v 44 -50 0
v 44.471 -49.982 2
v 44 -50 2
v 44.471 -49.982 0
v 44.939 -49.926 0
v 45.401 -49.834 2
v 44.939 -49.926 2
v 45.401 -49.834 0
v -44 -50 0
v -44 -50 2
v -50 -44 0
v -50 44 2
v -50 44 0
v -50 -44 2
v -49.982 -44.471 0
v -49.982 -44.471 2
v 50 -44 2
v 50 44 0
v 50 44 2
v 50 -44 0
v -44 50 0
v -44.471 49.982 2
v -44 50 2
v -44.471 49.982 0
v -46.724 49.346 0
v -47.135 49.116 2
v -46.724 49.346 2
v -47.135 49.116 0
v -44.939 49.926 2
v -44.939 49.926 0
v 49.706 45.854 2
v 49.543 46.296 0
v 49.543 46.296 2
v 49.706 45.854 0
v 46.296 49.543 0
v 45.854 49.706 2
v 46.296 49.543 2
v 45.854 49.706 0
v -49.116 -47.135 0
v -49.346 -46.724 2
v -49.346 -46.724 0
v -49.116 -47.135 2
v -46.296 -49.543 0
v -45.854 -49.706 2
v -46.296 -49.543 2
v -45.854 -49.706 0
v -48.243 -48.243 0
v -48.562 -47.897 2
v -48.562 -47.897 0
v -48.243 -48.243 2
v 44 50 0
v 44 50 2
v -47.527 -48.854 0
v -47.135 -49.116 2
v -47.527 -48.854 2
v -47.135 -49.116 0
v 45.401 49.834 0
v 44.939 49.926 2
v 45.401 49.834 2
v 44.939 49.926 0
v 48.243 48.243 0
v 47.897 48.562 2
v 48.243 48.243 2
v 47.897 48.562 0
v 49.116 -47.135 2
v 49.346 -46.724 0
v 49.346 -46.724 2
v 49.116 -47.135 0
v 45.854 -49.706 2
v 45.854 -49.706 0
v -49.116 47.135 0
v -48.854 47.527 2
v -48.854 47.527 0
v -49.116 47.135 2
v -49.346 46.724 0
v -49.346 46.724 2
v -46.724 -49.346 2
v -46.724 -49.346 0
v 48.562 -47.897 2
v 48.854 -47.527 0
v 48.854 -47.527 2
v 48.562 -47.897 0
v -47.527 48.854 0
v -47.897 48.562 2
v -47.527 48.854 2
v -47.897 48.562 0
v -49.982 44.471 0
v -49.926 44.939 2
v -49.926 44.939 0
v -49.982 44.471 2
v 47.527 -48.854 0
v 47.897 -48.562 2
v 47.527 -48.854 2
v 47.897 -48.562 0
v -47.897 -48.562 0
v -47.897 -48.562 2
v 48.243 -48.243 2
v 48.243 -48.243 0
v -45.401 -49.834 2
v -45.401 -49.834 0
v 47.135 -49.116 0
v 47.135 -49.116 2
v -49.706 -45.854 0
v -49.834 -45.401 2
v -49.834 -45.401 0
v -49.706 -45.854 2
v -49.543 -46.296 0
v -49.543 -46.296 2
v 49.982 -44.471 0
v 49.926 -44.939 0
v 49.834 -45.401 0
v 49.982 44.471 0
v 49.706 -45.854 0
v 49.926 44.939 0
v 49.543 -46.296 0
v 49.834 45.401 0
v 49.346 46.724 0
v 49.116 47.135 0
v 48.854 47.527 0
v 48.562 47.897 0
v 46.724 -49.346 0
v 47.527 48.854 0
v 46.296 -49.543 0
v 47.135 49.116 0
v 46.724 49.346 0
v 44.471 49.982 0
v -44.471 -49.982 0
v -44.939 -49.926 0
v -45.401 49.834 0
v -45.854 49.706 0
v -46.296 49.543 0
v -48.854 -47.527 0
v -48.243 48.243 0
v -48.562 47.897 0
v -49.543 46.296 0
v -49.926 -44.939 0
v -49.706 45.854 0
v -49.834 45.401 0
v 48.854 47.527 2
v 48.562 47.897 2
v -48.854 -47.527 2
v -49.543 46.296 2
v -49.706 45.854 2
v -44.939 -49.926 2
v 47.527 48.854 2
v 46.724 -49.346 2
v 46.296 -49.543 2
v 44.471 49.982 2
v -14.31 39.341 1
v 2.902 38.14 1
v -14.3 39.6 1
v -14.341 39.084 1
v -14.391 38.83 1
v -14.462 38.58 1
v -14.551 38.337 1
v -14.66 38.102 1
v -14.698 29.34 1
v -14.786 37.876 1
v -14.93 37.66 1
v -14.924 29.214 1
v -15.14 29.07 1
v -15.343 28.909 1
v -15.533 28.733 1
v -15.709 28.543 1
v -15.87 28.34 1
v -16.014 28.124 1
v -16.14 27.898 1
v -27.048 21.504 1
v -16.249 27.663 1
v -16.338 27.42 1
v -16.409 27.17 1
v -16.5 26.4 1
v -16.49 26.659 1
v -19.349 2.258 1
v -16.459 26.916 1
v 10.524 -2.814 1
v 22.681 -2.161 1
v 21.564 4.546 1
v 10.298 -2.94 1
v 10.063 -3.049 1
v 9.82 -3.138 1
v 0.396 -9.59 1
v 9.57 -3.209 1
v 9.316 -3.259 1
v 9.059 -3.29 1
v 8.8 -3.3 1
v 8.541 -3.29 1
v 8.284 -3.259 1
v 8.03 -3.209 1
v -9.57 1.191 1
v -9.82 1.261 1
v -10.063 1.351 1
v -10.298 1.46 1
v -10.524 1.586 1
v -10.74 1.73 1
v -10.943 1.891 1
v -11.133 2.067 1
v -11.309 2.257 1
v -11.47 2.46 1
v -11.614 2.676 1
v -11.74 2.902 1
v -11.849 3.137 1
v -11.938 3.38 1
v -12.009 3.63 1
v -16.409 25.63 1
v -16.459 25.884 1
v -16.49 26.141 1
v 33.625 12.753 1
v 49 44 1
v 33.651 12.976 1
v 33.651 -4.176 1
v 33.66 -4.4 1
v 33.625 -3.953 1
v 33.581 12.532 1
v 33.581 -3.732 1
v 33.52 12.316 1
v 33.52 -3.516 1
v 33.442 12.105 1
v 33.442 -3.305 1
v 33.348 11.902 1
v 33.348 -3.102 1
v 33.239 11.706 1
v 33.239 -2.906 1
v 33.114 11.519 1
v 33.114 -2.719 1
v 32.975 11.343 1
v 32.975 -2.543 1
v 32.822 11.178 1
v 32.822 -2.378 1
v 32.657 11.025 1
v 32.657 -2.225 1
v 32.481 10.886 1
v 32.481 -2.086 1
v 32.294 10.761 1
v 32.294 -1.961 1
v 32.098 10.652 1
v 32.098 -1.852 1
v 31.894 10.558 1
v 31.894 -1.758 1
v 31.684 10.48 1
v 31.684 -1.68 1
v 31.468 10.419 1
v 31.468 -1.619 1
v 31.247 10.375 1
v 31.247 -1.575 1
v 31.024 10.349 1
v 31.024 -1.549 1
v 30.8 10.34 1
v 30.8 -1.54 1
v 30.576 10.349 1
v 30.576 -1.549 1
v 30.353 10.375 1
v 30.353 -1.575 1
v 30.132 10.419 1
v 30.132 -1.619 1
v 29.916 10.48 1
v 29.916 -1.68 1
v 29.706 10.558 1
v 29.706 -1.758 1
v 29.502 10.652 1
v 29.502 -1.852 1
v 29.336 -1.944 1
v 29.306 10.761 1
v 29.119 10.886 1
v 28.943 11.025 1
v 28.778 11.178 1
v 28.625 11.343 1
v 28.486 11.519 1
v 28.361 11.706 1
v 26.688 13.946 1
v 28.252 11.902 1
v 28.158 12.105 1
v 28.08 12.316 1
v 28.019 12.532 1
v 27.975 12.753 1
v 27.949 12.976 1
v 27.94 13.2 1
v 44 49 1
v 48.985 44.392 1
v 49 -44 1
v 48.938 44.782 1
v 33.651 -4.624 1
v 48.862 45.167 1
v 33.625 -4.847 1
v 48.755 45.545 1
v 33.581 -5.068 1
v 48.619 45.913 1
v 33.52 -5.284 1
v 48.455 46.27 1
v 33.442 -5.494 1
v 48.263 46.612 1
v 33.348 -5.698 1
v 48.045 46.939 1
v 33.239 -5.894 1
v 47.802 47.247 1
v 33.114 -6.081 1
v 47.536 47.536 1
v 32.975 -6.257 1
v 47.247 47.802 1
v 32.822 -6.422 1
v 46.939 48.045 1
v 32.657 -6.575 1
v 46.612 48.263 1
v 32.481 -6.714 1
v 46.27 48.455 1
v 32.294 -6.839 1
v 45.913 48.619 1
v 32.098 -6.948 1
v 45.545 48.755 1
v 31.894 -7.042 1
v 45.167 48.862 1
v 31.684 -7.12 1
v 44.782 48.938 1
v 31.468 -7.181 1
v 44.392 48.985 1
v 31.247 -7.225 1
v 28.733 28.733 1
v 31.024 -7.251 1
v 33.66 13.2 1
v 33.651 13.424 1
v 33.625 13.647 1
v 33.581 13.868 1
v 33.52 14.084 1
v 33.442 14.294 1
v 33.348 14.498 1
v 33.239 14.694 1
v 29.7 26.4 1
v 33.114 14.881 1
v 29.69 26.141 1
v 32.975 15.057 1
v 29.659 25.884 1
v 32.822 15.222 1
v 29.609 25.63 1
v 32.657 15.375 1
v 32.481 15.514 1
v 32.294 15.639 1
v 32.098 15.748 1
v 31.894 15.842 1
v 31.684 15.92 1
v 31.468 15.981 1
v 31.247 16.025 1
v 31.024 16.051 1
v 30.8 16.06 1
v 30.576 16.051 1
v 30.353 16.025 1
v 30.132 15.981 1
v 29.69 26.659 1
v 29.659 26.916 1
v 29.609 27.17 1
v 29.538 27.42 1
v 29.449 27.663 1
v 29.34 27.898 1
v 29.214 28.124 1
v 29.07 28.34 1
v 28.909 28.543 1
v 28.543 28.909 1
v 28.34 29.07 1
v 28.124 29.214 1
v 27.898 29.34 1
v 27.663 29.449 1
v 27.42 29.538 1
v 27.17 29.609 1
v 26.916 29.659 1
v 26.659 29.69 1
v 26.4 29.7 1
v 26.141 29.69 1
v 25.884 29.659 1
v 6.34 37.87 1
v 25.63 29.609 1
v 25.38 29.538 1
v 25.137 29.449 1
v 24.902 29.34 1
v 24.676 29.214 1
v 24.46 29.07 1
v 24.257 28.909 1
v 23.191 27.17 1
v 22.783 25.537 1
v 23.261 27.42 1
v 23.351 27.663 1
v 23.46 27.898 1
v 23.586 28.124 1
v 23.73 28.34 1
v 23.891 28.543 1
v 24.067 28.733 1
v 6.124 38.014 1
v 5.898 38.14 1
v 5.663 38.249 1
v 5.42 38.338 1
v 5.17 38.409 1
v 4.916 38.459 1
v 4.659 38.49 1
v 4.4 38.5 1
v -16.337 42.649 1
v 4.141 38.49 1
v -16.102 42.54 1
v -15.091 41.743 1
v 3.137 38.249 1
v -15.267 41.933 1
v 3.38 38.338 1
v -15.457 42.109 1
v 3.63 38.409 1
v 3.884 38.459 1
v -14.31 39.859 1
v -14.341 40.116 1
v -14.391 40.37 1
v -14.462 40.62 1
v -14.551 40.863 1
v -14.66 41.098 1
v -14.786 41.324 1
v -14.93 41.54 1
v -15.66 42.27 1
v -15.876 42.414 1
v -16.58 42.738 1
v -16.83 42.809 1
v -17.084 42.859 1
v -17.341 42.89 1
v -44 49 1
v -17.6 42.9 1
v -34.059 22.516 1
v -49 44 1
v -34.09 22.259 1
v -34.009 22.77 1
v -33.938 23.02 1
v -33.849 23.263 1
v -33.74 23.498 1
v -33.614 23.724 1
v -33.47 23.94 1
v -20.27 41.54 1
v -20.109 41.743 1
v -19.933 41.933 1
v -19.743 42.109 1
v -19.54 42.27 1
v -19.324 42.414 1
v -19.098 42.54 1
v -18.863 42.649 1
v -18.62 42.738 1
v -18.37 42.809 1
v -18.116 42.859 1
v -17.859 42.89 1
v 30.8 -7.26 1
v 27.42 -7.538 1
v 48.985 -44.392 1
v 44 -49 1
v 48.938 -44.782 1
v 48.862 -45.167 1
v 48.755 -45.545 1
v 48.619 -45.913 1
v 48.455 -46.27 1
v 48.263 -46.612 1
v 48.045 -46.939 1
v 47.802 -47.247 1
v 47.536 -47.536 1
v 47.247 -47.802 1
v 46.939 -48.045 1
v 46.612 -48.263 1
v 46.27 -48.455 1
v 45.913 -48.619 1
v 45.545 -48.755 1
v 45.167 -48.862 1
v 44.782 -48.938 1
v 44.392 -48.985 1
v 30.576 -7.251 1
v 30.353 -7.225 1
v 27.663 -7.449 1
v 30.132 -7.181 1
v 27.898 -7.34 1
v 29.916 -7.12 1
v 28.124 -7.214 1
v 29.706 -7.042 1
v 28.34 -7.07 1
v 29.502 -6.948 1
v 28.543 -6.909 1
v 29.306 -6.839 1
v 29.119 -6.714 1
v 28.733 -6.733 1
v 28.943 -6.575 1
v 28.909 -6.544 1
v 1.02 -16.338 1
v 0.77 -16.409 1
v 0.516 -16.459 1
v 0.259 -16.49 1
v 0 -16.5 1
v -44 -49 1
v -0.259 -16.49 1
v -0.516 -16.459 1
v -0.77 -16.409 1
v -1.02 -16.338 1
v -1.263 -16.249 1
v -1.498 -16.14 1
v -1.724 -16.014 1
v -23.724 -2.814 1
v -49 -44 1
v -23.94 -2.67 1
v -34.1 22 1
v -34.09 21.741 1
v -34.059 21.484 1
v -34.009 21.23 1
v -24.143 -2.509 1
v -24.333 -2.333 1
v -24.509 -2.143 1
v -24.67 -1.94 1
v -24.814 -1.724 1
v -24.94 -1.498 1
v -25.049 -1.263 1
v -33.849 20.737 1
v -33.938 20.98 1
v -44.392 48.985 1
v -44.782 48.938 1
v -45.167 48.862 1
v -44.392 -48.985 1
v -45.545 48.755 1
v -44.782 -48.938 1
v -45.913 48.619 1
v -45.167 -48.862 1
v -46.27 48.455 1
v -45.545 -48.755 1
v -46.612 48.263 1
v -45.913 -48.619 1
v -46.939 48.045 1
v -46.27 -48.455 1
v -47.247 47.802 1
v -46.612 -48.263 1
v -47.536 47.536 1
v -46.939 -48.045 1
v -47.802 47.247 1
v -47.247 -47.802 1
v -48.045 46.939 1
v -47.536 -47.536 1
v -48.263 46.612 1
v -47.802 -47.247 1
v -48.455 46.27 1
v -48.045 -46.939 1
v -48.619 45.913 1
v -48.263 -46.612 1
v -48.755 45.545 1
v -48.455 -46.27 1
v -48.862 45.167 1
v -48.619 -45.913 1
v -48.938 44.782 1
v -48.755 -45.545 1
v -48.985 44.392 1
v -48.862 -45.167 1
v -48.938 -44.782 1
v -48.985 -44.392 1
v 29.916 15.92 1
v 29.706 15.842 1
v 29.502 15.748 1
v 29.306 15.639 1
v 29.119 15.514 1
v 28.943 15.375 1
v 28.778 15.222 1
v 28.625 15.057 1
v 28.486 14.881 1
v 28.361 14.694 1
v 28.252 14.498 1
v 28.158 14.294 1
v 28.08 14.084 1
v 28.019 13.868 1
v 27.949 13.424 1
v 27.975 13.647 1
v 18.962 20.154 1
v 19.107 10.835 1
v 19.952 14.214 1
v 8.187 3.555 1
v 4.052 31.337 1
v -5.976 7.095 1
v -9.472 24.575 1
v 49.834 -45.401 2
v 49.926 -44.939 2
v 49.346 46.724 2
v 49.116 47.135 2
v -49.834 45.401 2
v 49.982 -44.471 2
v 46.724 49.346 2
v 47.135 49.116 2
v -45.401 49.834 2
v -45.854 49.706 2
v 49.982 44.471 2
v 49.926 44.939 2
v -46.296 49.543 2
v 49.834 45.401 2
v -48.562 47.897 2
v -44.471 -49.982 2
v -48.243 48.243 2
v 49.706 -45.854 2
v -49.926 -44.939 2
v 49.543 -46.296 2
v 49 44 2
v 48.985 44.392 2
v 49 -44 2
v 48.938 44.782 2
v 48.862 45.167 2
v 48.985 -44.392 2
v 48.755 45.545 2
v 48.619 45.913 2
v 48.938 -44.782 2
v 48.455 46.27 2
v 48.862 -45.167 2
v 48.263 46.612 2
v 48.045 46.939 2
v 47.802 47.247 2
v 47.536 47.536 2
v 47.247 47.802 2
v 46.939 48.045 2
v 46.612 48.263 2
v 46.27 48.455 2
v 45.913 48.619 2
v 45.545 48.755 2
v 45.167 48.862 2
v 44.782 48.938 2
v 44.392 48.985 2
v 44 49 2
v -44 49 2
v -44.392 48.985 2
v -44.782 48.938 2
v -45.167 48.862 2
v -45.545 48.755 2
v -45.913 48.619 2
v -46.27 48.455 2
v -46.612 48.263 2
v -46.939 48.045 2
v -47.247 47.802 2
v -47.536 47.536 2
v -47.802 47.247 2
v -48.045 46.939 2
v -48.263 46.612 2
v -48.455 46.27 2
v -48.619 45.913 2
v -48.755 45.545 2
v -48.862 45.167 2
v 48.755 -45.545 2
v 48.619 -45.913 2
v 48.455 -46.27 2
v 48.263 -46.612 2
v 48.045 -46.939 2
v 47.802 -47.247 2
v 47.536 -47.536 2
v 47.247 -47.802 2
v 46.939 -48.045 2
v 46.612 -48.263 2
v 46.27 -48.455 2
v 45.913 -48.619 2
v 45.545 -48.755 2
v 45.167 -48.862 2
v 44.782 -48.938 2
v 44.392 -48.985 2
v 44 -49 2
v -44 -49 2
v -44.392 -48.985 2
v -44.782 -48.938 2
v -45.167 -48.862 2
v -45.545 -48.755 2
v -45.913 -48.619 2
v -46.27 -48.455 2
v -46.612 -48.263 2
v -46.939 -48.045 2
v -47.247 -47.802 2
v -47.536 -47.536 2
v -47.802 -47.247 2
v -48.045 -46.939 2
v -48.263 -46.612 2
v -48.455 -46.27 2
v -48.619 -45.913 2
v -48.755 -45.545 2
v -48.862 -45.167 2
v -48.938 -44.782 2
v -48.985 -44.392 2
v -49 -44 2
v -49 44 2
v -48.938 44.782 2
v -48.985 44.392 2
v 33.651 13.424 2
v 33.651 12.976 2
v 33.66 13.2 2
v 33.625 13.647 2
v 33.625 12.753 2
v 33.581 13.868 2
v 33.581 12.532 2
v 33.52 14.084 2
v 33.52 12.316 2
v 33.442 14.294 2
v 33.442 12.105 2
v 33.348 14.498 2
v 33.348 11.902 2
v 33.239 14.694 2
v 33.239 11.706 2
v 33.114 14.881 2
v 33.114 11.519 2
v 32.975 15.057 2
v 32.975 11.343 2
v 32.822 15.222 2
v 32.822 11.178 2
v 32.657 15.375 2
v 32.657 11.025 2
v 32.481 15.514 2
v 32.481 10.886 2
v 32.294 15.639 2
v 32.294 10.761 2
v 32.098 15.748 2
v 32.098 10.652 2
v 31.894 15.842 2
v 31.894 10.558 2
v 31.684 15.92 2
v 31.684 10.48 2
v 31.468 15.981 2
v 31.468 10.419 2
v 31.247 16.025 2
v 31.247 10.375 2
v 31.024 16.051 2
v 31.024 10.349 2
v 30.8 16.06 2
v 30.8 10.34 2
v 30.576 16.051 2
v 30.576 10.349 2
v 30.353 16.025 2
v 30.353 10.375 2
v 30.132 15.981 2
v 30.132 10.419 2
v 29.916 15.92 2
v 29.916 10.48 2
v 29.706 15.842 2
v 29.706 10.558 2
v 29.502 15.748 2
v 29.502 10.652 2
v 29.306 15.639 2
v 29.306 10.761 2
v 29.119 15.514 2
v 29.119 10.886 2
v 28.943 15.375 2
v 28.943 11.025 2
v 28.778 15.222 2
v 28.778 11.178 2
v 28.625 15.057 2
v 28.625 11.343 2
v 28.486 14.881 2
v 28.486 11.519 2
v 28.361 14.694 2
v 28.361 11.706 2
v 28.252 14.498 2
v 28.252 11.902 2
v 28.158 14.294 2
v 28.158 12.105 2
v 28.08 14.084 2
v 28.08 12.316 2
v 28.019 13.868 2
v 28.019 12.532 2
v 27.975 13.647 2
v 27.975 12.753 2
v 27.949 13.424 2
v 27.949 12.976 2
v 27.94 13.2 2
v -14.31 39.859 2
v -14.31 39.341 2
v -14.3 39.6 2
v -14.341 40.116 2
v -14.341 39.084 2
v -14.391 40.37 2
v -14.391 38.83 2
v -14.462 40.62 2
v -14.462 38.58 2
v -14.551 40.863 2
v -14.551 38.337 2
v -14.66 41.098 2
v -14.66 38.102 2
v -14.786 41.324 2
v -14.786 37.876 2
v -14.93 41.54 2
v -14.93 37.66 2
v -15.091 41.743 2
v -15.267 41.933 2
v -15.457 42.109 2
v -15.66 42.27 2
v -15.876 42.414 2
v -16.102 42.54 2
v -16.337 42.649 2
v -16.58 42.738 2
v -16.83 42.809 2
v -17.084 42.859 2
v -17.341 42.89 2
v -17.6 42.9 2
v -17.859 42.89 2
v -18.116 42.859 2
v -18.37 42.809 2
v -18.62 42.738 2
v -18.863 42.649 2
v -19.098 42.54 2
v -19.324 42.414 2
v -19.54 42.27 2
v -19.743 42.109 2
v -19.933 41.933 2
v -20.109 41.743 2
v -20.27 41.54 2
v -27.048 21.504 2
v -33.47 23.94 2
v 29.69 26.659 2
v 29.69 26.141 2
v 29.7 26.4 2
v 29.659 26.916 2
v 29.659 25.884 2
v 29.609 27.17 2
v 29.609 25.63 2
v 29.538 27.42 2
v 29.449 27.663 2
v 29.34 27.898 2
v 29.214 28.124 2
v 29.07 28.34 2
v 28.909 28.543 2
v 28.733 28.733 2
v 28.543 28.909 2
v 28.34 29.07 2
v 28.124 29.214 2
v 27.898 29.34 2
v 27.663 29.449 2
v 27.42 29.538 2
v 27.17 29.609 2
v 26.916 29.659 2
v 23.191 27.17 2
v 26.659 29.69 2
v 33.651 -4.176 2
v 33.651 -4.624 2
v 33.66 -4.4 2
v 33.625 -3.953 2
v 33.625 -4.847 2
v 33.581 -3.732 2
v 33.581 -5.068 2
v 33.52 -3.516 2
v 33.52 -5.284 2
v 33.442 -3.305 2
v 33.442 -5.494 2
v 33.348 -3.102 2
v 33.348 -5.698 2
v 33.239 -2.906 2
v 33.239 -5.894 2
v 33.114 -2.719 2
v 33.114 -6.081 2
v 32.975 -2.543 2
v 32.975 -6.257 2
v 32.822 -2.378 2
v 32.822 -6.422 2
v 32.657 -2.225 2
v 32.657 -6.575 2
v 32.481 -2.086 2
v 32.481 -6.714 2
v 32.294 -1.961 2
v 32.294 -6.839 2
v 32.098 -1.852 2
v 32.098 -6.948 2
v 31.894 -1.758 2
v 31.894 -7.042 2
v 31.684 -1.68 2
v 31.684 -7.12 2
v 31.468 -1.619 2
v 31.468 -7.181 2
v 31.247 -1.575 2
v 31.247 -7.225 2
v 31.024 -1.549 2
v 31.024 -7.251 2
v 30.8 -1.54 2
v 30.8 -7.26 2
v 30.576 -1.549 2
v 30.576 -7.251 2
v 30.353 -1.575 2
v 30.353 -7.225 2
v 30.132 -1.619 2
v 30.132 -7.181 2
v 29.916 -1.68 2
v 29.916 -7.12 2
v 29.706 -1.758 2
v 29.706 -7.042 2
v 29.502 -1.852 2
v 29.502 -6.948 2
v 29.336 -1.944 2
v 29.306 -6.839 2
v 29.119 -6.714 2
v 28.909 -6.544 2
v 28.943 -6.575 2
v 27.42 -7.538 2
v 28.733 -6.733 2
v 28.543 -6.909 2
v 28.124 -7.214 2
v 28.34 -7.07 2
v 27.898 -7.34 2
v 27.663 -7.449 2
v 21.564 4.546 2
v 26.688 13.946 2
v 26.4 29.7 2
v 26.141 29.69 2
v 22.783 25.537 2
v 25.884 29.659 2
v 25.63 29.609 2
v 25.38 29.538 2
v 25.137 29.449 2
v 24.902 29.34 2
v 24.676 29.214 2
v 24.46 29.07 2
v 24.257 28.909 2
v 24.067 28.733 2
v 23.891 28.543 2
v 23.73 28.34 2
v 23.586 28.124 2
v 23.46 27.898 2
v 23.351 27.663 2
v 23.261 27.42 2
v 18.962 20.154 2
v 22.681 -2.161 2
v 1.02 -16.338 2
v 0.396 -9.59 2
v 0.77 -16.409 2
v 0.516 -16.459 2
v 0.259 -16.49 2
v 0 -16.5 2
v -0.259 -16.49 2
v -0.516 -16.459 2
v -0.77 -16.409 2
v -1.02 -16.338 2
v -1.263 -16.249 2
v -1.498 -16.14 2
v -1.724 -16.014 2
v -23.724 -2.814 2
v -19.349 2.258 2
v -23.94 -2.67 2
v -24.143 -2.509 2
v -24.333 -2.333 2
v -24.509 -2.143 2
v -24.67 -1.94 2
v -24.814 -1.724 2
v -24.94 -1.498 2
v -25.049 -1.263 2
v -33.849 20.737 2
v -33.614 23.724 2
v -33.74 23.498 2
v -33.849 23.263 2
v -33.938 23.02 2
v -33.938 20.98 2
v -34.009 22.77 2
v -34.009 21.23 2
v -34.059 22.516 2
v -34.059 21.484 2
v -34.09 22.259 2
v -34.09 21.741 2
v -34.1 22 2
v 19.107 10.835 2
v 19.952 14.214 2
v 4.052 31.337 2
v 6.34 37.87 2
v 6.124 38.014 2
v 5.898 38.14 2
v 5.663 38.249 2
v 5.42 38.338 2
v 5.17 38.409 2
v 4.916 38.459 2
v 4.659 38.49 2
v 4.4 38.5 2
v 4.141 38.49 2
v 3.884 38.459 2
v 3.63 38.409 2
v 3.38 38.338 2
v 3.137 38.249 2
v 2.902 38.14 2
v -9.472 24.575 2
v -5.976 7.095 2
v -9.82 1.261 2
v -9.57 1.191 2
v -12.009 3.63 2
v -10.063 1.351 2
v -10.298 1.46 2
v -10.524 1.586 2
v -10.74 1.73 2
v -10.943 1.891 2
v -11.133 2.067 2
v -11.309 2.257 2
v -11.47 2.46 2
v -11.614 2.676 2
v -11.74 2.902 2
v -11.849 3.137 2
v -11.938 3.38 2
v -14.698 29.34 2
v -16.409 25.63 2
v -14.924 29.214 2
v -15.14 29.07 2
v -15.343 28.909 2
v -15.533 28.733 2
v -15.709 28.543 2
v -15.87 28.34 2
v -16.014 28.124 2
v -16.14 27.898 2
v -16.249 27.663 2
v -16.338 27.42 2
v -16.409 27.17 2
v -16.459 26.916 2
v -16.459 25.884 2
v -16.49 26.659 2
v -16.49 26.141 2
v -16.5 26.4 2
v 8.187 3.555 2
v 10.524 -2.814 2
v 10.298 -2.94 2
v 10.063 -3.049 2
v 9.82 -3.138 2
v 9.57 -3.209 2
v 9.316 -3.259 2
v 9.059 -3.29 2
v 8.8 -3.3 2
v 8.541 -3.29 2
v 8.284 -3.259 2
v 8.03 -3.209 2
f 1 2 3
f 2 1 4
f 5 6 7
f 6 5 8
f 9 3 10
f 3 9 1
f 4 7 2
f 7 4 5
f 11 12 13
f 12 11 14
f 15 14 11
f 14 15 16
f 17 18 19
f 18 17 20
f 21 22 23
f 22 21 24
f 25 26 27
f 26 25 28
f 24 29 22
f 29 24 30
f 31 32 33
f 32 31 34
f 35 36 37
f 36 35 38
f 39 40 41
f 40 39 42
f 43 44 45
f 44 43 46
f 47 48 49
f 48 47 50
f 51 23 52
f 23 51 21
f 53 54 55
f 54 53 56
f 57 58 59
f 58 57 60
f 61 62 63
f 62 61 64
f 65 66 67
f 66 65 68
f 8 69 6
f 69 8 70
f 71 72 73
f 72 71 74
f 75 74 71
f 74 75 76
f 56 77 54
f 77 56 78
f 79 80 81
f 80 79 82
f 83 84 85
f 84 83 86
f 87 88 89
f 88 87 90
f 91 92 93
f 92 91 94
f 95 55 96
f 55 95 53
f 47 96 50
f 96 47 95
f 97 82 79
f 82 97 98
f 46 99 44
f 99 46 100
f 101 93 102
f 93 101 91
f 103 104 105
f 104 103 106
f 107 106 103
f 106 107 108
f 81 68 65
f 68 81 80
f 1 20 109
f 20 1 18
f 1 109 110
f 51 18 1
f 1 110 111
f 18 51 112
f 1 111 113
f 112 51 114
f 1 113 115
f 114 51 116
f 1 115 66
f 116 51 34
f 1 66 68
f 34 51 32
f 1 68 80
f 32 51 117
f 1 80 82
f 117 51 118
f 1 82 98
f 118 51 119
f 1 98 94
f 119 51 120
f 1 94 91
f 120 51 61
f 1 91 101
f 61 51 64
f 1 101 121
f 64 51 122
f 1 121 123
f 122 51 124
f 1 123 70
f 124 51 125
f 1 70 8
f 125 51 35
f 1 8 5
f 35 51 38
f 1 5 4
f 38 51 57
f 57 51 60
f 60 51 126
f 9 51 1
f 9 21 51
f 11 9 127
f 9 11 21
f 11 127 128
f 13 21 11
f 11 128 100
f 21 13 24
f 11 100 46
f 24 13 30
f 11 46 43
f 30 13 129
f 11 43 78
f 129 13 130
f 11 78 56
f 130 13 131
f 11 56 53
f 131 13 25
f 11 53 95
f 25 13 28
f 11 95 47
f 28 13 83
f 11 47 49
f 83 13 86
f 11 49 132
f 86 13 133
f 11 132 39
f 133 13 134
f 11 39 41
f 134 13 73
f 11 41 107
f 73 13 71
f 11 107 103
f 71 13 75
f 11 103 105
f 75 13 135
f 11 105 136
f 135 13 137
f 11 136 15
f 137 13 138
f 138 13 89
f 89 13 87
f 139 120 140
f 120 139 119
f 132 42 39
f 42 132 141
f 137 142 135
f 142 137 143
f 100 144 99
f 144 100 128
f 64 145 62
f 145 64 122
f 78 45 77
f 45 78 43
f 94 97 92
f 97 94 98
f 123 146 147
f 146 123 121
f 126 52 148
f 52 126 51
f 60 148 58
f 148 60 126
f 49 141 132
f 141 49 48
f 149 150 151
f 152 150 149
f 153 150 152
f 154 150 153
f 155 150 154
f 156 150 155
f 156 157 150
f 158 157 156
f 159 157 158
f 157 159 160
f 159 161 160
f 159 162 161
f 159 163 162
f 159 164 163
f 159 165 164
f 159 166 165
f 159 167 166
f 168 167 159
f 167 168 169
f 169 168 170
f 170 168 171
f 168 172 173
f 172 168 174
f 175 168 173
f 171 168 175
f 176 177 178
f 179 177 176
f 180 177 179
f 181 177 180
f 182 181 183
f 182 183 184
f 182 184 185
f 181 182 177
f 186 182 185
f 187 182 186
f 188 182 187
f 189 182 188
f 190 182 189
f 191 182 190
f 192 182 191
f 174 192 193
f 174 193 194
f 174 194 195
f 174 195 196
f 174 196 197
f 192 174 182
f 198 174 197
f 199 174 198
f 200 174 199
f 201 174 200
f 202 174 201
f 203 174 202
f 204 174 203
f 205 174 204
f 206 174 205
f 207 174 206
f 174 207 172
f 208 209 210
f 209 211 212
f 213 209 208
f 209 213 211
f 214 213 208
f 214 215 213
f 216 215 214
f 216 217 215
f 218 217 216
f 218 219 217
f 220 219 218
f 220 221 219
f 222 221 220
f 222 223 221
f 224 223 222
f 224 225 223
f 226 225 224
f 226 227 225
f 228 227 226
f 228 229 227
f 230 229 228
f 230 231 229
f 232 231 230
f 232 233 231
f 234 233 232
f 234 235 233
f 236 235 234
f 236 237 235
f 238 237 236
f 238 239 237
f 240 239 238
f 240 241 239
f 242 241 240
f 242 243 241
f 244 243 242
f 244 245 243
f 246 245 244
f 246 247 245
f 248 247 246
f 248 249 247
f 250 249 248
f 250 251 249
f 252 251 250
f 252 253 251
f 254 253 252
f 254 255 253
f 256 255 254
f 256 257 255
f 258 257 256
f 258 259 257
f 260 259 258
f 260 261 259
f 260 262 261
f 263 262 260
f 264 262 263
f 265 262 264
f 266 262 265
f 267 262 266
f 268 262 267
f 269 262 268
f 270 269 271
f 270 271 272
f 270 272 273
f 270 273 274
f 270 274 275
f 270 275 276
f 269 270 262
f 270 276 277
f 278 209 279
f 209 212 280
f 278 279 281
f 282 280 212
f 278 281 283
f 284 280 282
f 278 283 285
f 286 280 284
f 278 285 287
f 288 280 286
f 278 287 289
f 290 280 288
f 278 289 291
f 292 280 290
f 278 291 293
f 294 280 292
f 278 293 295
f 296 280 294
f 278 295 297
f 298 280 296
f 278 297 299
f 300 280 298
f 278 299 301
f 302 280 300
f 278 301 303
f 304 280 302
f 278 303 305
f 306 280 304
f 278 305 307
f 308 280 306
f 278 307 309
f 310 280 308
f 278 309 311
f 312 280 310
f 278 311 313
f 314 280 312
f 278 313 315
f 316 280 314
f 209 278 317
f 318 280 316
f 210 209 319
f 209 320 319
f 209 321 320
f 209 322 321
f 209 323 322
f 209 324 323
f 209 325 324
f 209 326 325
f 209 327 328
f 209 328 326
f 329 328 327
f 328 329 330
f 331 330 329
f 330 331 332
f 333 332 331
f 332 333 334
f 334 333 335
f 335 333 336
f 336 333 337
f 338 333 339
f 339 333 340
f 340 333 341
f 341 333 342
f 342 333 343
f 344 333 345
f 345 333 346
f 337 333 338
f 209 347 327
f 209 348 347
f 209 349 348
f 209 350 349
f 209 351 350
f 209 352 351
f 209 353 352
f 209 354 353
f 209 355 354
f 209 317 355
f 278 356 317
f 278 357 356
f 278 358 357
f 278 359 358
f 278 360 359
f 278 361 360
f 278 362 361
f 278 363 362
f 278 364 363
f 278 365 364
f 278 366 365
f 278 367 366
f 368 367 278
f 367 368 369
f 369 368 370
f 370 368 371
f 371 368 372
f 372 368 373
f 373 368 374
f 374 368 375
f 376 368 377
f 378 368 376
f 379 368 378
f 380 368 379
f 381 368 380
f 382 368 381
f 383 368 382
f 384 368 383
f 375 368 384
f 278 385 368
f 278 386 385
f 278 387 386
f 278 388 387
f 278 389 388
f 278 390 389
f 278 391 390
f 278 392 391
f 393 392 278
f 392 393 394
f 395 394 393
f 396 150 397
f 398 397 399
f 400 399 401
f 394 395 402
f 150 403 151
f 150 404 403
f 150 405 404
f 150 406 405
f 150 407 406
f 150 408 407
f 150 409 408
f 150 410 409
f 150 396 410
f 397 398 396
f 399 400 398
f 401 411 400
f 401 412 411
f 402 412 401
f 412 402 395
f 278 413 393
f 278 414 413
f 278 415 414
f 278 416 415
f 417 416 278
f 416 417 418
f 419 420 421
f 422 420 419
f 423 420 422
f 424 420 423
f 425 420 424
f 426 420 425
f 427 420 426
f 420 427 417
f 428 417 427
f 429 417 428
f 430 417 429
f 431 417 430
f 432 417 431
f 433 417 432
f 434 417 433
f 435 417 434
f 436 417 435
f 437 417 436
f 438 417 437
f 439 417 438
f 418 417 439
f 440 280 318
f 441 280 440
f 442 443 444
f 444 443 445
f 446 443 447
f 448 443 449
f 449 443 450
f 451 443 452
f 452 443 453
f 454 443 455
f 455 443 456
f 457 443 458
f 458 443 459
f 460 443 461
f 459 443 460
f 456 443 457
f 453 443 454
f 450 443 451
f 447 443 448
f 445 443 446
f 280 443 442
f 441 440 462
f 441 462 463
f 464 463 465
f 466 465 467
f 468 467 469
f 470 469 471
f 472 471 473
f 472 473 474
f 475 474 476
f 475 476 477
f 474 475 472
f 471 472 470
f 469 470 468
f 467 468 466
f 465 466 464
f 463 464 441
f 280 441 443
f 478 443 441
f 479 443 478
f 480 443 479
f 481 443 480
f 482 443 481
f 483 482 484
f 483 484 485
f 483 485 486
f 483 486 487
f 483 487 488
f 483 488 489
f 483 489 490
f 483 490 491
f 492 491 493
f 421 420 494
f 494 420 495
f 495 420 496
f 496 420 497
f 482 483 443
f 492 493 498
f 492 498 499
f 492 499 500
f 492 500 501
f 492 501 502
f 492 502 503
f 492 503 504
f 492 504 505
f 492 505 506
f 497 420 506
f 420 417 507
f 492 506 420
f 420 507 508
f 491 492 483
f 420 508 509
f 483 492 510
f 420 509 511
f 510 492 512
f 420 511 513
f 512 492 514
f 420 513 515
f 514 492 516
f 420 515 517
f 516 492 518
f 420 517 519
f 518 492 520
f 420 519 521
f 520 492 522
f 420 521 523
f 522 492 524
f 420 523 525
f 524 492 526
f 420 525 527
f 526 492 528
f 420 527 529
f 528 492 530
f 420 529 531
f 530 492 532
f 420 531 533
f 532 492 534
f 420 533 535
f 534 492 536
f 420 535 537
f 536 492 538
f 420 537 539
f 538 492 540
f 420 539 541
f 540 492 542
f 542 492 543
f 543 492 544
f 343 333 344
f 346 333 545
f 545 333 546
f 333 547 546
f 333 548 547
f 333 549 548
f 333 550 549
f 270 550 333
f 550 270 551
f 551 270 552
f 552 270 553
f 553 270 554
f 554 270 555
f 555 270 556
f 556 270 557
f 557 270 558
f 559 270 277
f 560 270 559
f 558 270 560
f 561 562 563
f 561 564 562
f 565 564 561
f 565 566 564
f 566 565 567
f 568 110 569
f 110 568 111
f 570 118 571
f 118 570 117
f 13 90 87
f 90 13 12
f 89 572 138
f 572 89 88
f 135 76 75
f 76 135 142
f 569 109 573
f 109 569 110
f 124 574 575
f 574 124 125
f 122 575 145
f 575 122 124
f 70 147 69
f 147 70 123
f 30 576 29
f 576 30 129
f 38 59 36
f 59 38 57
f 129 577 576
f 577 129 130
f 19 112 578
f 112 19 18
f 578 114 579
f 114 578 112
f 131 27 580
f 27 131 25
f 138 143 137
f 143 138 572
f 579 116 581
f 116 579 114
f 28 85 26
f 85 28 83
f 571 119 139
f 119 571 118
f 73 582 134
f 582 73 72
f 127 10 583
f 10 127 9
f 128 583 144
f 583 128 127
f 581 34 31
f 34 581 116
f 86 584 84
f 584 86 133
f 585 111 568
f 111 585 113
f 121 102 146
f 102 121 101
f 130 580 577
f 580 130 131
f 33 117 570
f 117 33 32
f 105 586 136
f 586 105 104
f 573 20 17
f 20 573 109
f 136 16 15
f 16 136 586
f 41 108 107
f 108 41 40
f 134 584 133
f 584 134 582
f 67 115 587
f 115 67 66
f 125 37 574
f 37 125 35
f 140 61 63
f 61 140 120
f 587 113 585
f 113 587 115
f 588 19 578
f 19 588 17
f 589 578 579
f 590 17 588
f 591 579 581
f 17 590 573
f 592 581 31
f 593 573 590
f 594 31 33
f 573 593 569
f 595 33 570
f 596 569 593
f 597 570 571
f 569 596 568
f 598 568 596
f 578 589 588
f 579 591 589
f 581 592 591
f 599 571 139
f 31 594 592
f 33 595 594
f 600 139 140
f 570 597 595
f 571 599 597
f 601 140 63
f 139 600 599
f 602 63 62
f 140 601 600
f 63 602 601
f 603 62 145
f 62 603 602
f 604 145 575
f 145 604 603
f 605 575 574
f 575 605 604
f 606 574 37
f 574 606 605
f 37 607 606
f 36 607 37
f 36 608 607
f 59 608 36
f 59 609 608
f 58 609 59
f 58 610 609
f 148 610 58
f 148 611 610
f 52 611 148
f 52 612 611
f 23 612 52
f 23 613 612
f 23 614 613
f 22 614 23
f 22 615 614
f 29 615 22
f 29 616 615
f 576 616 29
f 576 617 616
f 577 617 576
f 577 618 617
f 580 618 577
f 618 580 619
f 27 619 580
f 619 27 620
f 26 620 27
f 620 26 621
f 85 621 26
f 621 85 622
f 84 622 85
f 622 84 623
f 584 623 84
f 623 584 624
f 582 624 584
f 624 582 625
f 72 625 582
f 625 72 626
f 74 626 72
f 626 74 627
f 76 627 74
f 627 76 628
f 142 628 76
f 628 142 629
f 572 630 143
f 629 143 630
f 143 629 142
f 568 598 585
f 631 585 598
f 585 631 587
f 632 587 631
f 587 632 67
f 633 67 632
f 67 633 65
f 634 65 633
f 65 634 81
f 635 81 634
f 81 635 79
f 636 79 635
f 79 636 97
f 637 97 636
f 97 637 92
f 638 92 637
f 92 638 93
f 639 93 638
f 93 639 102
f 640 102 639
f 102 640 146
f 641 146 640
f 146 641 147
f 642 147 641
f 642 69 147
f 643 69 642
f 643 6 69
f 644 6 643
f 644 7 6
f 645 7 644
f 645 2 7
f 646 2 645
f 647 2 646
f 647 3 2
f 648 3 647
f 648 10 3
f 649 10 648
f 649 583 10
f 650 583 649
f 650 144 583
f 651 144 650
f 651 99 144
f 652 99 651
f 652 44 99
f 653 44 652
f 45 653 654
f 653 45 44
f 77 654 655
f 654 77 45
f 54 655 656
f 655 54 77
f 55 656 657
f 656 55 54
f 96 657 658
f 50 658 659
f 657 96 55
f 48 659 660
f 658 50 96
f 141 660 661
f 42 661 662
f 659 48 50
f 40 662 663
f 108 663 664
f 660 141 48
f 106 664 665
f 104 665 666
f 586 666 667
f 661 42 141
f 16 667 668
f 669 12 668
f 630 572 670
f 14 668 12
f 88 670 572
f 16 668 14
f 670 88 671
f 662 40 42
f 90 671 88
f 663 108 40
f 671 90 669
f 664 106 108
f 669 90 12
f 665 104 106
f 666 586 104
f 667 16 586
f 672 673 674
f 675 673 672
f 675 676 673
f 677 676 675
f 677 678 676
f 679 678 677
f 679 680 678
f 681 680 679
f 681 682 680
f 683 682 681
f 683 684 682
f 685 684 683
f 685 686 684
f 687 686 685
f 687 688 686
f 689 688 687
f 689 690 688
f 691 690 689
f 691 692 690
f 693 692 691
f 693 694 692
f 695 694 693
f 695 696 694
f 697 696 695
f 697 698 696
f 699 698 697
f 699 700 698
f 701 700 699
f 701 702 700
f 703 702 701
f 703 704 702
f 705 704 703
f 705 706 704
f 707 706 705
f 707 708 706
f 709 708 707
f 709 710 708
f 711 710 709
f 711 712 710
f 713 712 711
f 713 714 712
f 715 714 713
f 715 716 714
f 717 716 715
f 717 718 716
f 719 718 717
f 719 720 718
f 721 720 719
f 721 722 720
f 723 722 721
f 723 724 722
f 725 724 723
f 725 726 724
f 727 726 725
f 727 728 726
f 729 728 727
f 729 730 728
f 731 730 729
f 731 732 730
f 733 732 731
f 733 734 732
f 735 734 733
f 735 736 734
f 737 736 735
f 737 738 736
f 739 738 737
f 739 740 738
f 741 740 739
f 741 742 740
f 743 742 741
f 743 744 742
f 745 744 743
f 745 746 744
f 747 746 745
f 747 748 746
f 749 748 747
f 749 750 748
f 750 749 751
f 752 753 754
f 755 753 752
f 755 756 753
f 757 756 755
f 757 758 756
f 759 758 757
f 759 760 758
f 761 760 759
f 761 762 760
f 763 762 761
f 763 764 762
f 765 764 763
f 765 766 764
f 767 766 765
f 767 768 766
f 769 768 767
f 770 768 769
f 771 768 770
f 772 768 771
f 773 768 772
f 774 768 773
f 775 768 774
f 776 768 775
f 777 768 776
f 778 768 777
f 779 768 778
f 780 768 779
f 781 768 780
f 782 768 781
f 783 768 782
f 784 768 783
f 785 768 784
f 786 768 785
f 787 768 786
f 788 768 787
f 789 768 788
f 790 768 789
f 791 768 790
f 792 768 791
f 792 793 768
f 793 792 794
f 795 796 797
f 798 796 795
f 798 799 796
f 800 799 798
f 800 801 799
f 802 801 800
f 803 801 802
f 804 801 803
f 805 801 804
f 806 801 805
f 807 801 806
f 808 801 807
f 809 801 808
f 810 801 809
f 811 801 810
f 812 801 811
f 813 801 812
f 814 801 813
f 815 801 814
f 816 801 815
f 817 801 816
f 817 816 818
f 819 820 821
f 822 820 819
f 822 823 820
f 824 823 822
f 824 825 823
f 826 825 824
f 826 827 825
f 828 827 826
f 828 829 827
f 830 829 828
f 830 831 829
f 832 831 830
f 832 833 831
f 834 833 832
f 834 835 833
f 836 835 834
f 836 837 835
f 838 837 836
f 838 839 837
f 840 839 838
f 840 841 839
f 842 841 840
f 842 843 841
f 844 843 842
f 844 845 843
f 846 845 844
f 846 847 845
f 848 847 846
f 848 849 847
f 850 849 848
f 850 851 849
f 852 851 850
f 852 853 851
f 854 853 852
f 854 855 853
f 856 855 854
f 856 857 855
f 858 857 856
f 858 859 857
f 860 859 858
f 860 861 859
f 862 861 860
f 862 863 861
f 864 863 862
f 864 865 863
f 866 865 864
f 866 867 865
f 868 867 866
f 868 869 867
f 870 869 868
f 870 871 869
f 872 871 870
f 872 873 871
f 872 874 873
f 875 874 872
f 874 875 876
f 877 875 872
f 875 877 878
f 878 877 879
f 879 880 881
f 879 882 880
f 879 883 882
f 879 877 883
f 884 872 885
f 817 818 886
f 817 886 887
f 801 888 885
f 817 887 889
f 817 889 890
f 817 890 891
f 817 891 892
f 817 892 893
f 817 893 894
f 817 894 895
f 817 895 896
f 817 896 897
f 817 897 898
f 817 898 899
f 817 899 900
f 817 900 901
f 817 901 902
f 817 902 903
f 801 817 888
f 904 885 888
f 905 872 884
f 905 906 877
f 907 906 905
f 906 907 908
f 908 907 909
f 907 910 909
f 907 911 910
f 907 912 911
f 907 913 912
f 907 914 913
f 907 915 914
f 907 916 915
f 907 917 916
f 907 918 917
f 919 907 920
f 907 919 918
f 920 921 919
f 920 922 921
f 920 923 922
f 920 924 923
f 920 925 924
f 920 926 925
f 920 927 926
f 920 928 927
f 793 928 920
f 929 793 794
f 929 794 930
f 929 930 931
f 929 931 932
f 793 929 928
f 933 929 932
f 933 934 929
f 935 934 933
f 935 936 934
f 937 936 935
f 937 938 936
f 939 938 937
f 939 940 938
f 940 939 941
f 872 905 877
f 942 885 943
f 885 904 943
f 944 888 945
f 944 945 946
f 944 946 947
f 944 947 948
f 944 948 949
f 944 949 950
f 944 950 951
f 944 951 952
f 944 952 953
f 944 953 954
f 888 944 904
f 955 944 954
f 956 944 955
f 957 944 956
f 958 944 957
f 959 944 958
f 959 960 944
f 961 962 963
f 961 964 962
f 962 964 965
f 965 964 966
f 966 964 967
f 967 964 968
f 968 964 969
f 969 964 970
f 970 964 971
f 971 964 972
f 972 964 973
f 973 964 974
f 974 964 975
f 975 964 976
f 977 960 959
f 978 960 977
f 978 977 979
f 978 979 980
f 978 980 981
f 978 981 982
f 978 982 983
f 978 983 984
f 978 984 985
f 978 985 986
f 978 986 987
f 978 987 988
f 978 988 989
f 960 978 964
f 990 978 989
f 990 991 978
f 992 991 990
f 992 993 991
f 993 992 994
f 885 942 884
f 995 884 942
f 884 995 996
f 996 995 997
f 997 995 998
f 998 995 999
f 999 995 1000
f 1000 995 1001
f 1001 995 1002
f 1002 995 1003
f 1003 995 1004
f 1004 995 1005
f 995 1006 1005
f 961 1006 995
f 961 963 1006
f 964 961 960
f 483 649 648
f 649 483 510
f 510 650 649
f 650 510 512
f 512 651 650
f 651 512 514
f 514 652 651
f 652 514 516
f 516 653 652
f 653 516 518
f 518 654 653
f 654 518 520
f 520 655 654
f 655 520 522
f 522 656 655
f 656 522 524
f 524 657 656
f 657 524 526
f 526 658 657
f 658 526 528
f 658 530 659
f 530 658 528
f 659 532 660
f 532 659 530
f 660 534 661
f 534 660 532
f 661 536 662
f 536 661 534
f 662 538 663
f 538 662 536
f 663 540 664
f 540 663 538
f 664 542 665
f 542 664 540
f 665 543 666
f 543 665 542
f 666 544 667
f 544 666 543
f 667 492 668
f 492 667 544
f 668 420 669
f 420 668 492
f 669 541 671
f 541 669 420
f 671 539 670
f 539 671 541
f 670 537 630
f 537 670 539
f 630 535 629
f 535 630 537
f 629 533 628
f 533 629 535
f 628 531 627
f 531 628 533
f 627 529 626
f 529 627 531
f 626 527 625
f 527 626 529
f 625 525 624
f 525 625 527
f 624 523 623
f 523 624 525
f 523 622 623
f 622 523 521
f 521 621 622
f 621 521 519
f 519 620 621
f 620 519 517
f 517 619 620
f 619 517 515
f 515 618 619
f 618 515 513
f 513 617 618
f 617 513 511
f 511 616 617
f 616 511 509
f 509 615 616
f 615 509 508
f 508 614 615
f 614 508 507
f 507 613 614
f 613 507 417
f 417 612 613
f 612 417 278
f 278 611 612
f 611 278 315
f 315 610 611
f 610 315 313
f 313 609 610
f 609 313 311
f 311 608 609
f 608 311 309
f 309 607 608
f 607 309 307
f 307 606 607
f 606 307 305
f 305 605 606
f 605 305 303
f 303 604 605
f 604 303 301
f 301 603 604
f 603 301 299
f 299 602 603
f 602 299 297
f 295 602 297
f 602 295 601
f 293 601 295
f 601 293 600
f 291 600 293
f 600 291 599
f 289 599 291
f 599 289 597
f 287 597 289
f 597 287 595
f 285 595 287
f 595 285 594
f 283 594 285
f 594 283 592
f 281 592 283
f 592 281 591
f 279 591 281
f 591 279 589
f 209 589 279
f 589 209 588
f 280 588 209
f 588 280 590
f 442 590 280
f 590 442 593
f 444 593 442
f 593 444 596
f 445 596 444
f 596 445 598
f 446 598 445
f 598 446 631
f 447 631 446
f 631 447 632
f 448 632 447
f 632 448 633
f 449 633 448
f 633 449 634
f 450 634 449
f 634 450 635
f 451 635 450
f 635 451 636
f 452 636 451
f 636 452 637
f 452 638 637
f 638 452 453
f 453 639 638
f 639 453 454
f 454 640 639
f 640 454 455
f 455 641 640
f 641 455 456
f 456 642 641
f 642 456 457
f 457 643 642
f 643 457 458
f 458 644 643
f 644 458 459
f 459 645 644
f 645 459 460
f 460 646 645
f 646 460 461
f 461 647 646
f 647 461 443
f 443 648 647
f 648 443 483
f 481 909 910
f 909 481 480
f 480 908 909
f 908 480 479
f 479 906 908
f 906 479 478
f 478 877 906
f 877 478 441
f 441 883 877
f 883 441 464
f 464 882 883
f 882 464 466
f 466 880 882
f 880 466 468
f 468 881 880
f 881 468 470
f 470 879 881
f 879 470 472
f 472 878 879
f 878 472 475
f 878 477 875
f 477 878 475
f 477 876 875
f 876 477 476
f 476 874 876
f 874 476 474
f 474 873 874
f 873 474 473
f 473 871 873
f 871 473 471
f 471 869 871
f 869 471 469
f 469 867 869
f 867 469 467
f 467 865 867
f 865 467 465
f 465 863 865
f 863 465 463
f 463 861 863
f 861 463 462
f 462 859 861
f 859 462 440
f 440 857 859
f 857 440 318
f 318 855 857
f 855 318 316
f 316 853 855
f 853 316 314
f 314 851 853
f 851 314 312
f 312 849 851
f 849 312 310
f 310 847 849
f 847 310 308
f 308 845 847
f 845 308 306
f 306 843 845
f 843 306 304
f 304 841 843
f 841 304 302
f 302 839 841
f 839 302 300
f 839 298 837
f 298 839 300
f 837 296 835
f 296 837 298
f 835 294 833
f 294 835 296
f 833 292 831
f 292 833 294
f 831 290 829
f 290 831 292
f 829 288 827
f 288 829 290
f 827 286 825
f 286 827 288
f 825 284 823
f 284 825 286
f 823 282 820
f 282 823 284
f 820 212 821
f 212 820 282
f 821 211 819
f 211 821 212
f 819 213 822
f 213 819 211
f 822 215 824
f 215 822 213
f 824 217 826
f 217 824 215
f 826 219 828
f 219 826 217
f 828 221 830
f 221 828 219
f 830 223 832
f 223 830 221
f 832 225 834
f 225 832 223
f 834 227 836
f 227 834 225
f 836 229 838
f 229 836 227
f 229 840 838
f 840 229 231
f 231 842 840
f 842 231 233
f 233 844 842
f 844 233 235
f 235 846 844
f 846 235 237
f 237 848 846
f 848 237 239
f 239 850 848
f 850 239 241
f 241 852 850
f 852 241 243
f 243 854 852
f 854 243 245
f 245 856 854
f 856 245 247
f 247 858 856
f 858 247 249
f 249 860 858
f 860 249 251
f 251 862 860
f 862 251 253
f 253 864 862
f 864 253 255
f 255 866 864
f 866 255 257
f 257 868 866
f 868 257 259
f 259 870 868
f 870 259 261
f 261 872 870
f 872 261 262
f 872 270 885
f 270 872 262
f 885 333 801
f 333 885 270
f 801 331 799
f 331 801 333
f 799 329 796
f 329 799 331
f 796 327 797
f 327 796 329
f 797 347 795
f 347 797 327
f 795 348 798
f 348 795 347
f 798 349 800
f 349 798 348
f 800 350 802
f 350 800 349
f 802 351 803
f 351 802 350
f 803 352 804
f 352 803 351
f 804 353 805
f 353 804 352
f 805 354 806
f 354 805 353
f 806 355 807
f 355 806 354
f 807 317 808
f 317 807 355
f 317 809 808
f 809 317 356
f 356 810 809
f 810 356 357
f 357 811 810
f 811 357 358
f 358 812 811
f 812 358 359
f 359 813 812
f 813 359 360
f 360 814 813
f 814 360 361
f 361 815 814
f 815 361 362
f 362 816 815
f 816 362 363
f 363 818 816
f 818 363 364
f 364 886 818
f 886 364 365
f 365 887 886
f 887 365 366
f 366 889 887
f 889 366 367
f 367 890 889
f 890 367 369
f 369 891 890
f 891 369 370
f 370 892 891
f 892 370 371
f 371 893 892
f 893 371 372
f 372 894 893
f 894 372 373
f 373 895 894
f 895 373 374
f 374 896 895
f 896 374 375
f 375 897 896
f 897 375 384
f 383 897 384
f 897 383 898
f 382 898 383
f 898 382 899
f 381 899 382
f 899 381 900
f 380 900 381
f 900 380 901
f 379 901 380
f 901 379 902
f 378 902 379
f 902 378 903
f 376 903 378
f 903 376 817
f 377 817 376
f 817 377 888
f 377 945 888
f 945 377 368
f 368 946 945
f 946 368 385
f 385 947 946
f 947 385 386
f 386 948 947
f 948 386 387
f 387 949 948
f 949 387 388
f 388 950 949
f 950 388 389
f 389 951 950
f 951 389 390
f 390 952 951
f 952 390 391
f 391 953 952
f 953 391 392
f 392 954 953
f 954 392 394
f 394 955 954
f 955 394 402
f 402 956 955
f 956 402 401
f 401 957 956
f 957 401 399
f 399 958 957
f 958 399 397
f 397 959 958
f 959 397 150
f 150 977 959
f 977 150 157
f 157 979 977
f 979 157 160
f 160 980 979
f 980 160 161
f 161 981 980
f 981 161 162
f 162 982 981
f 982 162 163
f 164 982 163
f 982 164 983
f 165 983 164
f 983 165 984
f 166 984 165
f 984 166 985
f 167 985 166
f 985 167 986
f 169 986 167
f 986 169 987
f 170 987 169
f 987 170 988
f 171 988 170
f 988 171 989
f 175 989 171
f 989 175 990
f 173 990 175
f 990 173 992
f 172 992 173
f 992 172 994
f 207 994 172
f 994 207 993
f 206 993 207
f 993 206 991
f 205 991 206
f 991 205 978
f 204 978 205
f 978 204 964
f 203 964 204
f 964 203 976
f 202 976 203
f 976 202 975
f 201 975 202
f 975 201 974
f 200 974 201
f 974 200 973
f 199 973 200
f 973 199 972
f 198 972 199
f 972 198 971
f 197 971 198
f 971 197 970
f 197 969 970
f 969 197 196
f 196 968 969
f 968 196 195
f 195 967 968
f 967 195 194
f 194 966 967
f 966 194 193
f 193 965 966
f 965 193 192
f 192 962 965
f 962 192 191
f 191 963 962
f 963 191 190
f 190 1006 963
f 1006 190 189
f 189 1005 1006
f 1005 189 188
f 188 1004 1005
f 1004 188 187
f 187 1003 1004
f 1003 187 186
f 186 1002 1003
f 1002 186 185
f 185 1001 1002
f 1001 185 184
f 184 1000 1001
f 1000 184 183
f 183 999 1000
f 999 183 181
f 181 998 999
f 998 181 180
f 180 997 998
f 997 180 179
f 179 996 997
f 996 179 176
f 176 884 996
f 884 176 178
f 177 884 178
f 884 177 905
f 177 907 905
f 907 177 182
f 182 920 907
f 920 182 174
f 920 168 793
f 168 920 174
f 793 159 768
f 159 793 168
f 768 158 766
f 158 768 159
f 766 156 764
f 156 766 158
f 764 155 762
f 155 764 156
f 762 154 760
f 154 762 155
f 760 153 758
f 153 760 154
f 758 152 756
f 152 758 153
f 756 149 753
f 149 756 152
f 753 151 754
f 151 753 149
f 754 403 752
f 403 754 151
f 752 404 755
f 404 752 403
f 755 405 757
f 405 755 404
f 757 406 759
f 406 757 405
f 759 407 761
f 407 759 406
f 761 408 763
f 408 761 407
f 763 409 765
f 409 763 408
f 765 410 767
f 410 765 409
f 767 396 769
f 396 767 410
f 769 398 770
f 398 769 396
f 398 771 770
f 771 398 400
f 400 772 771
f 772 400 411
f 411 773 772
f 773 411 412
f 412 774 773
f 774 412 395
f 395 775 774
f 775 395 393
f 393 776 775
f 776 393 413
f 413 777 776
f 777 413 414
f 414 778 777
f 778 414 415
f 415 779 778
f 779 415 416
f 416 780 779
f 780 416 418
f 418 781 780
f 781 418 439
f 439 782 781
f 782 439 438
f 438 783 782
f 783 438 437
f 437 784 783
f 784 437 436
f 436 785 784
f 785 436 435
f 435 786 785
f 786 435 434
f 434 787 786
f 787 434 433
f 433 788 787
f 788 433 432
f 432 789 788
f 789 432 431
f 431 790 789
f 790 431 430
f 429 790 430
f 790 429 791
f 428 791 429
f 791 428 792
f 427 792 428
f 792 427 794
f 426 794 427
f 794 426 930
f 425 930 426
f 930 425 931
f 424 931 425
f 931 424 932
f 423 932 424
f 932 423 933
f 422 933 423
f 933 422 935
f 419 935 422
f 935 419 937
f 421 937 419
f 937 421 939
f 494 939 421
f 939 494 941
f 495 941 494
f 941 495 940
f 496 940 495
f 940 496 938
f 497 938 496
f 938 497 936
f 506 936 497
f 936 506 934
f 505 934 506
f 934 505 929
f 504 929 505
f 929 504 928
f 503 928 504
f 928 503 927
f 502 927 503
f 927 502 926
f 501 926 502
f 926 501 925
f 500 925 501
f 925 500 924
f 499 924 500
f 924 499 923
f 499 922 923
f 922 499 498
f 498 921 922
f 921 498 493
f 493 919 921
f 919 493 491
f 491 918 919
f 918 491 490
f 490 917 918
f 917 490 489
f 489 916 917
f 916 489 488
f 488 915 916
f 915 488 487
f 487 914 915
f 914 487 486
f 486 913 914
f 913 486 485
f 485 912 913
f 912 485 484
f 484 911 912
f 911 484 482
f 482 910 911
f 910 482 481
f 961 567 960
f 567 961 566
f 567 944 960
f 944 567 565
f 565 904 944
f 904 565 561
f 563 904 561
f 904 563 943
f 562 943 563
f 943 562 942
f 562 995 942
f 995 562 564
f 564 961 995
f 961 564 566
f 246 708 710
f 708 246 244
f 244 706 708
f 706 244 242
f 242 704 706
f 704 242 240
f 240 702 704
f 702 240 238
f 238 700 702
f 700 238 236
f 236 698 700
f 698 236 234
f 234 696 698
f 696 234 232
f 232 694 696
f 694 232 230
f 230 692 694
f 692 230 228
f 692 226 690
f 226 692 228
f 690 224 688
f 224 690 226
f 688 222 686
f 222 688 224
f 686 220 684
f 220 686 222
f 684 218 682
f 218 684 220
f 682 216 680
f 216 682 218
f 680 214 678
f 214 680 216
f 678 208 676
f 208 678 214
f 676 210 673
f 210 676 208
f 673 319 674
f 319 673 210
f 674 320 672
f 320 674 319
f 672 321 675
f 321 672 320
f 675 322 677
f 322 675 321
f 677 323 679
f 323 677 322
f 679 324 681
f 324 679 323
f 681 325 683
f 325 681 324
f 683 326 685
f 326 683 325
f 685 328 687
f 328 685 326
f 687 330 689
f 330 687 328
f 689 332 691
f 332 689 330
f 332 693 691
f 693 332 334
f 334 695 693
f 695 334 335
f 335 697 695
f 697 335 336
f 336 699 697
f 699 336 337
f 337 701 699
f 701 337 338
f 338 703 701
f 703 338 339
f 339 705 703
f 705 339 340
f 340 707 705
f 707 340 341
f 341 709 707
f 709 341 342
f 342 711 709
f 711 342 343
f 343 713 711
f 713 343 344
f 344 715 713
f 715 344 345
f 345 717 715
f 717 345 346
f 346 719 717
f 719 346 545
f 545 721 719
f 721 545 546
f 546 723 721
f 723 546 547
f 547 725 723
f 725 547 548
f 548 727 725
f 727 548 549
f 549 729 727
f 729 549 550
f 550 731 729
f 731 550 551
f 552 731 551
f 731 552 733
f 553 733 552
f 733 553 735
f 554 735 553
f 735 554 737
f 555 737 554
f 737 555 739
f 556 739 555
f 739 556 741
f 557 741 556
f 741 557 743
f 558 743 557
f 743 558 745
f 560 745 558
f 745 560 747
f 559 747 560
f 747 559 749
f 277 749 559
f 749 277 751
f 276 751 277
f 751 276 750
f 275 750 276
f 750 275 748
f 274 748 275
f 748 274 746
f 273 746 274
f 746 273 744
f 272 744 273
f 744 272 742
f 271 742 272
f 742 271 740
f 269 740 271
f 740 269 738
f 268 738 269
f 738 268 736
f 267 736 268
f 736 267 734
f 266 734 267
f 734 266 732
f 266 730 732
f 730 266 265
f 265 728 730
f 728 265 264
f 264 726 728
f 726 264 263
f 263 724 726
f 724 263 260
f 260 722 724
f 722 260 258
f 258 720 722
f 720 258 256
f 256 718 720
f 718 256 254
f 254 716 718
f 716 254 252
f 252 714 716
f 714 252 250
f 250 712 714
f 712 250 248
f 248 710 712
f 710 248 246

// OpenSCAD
// 10x10 cm plate with rounded corners, 1 mm base and 1 mm top features.
// Top features: 1 mm frame and a bass clef ("cheia fa") in the center.

plate_size = 100;
corner_radius = 6;
base_thickness = 1;
top_thickness = 1;
frame_width = 1;

clef_scale = 2.2;
clef_stroke = 3.0;
clef_dots_r = 1.3;

$fn = 80;

module rounded_square_2d(size, r) {
  offset(r = r)
    square([size - 2 * r, size - 2 * r], center = true);
}

module frame_2d(size, r, w) {
  inner_size = size - 2 * w;
  inner_r = max(r - w, 0.1);
  difference() {
    rounded_square_2d(size, r);
    rounded_square_2d(inner_size, inner_r);
  }
}

module stroke_polyline(points, r) {
  for (i = [0 : len(points) - 2])
    hull() {
      translate(points[i])
        circle(r = r);
      translate(points[i + 1])
        circle(r = r);
    }
}

module bass_clef_2d() {
  base_points = [
    [-8, 18],
    [-14, 10],
    [-10, 0],
    [0, -6],
    [12, -2],
    [10, 10],
    [2, 16],
    [-6, 12],
    [-4, 2],
    [4, 0],
    [10, 4],
    [12, 12]
  ];
  scale([clef_scale, clef_scale])
    union() {
      stroke_polyline(base_points, clef_stroke / 2);
      translate([14, 6]) circle(r = clef_dots_r);
      translate([14, -2]) circle(r = clef_dots_r);
    }
}

module base_layer() {
  linear_extrude(height = base_thickness)
    rounded_square_2d(plate_size, corner_radius);
}

module top_features() {
  translate([0, 0, base_thickness])
    linear_extrude(height = top_thickness)
      union() {
        frame_2d(plate_size, corner_radius, frame_width);
        bass_clef_2d();
      }
}

union() {
  base_layer();
  top_features();
}
